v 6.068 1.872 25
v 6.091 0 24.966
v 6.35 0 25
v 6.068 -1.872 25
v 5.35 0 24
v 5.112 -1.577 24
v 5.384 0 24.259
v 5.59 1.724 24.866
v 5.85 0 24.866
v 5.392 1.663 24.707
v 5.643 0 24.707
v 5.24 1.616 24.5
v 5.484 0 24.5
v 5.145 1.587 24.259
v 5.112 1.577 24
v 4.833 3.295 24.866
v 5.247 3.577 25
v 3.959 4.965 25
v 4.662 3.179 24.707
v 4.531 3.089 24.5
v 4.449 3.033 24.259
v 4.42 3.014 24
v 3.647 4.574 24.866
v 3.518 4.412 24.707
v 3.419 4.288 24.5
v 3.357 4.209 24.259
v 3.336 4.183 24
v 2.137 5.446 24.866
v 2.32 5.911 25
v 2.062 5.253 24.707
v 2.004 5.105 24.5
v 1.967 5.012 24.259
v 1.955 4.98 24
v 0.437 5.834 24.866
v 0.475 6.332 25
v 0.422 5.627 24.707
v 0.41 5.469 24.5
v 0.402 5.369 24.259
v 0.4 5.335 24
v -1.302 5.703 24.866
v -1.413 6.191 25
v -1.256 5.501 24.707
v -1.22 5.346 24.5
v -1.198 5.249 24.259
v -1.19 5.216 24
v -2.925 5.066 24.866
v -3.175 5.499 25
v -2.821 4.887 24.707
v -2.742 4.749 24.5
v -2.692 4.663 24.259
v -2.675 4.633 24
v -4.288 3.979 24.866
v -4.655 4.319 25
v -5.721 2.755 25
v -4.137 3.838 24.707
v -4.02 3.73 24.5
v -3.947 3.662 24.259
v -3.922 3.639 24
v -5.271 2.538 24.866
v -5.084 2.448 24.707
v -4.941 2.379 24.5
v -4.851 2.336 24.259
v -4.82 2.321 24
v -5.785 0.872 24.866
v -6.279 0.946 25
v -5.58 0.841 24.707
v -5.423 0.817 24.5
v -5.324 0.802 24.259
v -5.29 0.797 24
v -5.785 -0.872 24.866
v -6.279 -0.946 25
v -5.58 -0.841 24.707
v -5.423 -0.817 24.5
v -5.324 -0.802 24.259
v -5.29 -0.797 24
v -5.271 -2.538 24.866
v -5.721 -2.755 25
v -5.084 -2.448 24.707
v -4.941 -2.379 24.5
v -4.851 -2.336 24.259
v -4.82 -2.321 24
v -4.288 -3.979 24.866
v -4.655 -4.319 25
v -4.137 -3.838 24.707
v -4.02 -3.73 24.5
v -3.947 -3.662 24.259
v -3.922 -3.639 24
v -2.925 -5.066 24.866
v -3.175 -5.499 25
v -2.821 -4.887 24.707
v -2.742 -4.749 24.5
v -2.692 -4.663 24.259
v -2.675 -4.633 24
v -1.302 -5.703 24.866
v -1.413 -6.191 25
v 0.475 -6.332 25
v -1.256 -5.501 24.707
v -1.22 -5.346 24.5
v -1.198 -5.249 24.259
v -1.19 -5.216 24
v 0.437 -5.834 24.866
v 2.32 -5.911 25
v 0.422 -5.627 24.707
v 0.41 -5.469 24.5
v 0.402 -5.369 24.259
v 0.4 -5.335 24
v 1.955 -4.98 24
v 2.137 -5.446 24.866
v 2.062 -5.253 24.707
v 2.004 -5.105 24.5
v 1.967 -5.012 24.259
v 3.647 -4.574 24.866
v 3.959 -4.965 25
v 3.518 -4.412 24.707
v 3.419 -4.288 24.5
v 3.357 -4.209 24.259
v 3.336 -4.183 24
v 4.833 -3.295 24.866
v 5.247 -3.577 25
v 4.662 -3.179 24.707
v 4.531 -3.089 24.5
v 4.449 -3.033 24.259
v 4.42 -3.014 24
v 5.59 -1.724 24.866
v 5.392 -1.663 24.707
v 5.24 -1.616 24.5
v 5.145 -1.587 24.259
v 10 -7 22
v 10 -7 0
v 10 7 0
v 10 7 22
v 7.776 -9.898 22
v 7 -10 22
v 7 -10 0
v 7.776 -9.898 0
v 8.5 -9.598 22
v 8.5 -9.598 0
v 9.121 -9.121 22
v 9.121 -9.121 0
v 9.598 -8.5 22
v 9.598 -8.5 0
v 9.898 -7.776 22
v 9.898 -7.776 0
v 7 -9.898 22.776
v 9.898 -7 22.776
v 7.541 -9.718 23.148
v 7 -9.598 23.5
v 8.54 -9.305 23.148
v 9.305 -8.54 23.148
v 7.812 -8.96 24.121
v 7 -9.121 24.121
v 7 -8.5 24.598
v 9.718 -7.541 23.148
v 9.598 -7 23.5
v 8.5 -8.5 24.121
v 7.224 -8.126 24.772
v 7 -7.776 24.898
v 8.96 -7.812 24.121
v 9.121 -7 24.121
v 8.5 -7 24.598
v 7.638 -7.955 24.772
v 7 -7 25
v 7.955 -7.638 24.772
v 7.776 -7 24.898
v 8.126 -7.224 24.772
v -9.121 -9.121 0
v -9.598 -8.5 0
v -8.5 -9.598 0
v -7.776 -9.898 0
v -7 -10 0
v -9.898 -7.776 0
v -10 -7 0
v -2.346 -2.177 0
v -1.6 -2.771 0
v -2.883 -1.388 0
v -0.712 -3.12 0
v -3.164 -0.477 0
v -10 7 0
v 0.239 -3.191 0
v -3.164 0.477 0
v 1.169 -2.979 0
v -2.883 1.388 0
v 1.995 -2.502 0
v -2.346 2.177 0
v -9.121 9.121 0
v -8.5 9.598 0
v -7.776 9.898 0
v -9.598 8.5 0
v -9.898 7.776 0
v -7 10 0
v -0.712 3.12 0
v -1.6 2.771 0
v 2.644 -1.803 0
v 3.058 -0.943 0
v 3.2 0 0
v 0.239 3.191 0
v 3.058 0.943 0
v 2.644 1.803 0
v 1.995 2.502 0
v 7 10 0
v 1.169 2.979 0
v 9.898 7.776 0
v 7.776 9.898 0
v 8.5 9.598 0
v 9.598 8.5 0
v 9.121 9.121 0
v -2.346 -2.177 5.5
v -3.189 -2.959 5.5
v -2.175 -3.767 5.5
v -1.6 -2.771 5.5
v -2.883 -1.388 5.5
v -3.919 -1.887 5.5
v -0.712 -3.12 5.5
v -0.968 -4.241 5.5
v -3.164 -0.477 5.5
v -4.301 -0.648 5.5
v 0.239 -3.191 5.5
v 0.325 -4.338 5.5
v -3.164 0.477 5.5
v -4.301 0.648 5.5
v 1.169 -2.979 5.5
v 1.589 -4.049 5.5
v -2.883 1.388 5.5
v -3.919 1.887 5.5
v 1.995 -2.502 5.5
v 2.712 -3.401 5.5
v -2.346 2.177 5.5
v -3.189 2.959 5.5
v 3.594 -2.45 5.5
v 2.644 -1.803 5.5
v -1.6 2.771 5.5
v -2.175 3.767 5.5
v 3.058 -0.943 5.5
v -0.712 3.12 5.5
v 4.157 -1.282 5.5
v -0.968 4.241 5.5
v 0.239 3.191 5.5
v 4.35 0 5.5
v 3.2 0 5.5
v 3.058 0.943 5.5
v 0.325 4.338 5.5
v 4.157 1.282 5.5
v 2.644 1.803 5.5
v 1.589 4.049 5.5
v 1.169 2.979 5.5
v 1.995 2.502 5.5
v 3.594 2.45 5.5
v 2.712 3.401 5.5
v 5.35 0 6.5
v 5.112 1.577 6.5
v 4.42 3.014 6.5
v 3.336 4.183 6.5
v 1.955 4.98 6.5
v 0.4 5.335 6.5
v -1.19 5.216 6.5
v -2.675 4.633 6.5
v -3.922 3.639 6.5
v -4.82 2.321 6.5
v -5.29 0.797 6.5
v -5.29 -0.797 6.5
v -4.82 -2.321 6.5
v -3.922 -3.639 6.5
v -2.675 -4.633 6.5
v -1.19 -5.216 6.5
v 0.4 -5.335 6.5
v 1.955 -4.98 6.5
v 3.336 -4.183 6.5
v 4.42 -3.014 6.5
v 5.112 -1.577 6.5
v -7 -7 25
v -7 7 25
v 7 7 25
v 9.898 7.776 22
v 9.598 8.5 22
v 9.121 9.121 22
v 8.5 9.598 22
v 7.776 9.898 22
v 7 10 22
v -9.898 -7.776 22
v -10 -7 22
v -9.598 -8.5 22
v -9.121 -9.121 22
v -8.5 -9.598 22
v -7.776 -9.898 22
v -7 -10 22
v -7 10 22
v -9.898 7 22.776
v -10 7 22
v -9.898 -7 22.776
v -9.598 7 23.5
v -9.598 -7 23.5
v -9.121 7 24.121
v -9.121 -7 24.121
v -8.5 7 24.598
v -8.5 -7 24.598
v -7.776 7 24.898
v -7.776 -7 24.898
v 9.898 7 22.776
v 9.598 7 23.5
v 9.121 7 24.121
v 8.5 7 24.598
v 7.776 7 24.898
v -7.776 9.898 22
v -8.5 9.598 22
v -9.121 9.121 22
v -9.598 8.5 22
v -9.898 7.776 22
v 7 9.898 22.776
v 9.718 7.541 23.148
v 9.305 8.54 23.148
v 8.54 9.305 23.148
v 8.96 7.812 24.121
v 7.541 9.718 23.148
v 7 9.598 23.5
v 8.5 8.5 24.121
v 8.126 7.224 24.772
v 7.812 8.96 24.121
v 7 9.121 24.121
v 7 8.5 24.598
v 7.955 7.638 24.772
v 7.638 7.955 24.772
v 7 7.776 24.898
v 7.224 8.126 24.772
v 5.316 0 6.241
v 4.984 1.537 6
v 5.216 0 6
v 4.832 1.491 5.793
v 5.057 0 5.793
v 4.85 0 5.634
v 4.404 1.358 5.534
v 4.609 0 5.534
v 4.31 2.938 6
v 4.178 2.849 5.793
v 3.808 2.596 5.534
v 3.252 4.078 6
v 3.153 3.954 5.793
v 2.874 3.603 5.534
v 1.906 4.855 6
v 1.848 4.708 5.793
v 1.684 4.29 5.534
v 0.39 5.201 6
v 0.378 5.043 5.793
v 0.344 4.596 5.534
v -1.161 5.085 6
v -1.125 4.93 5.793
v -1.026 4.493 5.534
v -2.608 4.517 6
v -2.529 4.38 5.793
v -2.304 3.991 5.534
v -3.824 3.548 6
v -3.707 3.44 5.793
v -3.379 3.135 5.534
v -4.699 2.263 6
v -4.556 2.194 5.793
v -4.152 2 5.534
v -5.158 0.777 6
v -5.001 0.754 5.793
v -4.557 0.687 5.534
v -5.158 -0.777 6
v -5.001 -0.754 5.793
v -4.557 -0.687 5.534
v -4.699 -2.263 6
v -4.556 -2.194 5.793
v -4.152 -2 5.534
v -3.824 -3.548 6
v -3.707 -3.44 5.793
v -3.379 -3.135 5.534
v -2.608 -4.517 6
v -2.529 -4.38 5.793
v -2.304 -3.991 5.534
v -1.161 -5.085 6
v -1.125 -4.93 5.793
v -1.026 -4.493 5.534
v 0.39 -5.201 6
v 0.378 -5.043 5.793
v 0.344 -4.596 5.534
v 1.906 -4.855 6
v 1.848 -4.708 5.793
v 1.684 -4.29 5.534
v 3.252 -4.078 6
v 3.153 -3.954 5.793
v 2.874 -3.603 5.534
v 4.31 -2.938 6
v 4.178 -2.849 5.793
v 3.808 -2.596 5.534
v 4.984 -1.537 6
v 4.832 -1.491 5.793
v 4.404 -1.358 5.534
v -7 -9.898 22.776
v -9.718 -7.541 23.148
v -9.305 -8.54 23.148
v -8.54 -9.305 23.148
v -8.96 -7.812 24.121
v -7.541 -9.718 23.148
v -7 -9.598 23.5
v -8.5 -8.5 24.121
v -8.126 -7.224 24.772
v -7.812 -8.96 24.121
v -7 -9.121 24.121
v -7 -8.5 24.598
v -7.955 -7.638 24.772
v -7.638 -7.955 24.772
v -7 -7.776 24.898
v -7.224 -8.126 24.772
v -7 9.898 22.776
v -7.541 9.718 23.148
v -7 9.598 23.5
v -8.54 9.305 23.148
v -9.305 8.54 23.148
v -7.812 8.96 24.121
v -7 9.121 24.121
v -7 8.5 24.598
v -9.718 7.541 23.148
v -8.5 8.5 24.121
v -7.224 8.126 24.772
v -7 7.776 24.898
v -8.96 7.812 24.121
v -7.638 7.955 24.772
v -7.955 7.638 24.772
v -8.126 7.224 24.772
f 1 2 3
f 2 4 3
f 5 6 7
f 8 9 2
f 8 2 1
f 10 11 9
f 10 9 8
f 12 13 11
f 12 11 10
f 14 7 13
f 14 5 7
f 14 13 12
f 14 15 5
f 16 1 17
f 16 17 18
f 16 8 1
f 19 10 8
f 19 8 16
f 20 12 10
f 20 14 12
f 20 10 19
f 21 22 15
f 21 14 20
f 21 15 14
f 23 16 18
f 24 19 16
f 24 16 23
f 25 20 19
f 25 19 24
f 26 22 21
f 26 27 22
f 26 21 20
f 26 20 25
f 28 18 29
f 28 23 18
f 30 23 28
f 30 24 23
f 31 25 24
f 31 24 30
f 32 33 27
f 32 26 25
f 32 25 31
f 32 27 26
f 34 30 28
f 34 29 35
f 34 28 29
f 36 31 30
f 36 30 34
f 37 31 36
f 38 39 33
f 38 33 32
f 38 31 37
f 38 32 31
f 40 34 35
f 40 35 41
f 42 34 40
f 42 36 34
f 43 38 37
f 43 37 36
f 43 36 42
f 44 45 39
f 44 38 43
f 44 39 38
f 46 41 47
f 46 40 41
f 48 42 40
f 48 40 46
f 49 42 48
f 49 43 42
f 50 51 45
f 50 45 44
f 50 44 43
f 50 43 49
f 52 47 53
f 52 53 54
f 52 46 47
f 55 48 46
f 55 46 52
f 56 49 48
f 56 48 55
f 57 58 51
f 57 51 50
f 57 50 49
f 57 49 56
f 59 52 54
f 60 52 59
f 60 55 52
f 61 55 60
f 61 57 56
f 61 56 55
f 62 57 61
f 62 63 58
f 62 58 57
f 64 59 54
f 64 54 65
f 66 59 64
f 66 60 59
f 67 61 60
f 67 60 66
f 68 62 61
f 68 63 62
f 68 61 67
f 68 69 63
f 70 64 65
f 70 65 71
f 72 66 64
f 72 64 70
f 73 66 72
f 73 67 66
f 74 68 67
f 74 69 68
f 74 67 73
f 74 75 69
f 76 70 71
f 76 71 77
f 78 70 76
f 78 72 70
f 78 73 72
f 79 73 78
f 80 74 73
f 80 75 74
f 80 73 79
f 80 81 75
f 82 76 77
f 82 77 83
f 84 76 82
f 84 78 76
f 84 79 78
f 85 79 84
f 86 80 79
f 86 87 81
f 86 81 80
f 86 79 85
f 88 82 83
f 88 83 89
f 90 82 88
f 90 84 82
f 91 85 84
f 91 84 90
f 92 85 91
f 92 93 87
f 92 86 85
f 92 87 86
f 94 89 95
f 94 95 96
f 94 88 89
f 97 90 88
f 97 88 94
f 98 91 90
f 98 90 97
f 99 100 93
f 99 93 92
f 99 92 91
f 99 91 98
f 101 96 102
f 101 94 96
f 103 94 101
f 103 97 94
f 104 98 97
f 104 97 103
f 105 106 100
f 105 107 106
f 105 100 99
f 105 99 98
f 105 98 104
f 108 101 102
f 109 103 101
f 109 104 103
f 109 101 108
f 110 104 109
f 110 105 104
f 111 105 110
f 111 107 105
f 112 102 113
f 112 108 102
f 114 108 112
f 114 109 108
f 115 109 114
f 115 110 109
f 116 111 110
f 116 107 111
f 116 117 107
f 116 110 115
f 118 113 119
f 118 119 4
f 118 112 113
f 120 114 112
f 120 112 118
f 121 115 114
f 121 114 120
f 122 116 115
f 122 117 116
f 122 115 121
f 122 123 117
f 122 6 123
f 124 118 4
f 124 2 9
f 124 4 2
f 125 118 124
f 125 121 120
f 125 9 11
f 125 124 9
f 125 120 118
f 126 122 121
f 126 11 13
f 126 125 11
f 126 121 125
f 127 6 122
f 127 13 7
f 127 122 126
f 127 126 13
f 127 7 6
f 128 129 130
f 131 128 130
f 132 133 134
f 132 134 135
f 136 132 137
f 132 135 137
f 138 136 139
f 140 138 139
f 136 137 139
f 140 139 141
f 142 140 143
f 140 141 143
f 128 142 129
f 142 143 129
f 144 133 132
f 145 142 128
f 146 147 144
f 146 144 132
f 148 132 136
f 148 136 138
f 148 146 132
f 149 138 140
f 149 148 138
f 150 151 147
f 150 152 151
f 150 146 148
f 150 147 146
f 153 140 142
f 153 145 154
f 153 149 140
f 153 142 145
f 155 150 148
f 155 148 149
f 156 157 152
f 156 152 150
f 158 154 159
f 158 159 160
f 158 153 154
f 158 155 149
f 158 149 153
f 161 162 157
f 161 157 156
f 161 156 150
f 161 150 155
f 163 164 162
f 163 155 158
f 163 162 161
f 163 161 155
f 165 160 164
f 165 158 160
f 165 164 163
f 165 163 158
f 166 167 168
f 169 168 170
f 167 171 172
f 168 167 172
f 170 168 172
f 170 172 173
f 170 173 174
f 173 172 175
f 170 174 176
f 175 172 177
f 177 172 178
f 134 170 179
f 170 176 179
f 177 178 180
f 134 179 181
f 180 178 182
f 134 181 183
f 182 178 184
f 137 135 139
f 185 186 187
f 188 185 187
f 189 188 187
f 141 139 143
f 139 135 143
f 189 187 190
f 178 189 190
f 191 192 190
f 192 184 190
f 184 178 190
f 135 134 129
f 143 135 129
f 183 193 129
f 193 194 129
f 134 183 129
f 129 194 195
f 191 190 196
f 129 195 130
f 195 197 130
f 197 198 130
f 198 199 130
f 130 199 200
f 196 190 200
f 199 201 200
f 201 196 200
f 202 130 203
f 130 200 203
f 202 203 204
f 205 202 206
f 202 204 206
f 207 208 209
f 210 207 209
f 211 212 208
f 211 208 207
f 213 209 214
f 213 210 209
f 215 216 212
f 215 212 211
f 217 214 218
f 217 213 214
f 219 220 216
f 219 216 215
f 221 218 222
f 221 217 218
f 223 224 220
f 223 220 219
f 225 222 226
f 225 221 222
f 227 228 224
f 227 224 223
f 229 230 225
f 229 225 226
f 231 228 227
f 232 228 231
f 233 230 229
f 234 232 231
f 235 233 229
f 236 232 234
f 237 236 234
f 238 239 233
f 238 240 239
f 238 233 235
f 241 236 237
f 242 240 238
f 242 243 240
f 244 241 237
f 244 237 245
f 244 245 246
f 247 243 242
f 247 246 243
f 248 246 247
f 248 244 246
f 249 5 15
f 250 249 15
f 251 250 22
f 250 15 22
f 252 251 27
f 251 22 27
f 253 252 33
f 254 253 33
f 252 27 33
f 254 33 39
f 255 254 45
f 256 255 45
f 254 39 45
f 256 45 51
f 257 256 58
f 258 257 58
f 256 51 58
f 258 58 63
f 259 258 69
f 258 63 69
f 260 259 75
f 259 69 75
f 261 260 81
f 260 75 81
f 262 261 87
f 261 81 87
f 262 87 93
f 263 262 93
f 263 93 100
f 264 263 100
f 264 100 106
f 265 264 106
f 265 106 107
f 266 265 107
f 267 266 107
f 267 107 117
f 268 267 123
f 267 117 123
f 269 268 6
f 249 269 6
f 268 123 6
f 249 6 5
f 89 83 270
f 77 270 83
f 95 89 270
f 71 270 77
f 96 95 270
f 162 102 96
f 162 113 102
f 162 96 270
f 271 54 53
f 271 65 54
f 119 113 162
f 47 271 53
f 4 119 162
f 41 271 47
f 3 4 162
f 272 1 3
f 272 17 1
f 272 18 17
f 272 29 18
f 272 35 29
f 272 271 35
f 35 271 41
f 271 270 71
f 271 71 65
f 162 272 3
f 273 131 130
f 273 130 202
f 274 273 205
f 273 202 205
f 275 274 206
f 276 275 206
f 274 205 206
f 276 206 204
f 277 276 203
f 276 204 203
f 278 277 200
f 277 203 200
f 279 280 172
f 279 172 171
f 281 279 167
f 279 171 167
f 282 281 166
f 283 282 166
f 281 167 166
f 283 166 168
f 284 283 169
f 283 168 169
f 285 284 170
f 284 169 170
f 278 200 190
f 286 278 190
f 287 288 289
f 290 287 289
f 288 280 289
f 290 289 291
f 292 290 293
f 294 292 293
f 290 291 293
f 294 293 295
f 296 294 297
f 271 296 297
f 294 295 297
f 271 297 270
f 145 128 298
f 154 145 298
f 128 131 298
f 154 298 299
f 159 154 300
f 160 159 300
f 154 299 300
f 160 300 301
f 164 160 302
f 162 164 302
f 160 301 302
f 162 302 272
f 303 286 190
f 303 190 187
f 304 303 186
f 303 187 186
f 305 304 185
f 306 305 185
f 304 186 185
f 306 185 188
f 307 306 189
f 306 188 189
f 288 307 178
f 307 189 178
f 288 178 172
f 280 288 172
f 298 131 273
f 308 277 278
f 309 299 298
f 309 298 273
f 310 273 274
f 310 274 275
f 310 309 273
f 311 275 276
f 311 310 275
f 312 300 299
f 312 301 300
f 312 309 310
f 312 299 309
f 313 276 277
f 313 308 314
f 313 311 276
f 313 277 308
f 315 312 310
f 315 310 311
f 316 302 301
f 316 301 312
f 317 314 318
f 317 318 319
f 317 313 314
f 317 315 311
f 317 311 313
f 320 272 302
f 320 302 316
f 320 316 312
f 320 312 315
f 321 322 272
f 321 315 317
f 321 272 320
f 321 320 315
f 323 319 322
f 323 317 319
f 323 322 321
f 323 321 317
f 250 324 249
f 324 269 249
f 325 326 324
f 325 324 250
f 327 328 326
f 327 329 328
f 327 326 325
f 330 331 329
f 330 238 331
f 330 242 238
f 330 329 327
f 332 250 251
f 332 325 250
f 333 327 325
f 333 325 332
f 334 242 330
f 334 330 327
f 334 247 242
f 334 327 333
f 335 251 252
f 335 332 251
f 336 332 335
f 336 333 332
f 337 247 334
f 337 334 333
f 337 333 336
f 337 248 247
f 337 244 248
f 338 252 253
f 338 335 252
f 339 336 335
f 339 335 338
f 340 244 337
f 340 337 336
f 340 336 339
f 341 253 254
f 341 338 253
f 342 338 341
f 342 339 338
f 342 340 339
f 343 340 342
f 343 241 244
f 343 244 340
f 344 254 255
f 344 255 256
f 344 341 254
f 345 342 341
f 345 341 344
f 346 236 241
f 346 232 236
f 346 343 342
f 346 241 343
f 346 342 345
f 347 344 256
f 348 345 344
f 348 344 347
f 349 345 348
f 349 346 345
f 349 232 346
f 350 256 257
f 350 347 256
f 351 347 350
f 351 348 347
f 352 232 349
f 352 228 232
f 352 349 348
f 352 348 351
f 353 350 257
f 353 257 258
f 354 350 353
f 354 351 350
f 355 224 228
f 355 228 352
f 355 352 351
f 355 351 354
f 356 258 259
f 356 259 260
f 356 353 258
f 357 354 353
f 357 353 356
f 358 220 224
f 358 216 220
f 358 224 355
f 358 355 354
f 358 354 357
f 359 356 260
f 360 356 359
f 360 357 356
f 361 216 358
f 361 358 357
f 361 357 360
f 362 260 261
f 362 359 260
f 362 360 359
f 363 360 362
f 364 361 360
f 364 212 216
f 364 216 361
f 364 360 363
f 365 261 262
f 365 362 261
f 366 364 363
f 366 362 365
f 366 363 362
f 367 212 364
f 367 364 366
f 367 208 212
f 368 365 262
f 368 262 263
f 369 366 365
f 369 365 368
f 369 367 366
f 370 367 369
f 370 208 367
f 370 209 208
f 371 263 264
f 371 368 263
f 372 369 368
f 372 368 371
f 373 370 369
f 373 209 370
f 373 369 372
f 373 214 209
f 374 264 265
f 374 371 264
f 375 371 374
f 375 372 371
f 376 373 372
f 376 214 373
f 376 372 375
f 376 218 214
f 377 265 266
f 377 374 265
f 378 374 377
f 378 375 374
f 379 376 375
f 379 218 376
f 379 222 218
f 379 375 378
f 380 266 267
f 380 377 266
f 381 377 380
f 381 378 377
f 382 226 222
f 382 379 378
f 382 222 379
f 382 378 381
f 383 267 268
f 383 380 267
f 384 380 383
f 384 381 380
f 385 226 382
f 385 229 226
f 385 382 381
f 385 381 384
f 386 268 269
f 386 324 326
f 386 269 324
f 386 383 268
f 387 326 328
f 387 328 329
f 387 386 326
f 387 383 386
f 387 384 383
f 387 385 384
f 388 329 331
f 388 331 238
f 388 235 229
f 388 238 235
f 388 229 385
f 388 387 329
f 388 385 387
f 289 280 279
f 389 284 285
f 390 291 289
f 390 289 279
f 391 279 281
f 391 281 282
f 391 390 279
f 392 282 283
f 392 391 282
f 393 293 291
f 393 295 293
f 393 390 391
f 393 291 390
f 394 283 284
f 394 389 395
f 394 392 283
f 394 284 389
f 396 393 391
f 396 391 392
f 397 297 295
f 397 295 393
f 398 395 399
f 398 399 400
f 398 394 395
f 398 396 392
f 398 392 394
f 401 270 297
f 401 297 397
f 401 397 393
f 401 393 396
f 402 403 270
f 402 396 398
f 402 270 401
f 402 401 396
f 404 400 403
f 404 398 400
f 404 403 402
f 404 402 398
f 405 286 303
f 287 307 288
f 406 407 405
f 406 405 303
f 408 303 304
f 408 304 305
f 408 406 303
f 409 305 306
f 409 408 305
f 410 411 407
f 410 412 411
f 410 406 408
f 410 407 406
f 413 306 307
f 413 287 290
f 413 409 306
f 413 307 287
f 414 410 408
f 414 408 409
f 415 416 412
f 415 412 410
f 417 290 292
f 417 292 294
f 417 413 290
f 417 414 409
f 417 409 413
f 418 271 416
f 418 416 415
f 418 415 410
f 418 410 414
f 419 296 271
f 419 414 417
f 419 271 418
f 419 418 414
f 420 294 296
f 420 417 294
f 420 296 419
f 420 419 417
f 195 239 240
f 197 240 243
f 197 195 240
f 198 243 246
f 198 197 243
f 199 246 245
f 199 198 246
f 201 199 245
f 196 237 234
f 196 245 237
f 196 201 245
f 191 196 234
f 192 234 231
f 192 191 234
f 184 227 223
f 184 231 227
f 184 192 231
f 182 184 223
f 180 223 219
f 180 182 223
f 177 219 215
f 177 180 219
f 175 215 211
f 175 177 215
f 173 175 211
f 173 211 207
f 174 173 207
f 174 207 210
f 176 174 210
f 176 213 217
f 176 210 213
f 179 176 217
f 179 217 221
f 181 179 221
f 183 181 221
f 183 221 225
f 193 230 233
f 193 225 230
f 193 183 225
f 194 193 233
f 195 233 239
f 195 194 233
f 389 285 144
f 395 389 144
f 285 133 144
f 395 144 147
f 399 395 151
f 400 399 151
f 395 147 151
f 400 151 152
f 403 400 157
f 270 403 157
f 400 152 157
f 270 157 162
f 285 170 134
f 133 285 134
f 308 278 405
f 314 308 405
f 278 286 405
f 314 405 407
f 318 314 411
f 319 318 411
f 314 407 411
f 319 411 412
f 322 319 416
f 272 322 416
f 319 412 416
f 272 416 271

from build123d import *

# Parameters (mm, degrees)
SKETCH1_R           = 3.2
BOSS_EXTRUDE1_DEPTH = 25
FILLET1_R           = 3
SKETCH2_R           = 5.35
CUT_EXTRUDE1_DEPTH  = 19.5
FILLET2_R           = 1
FILLET3_R           = 1


with BuildPart() as part:
    # Sketch1 → Boss-Extrude1 (new body)
    with BuildSketch(Plane.XY):
        with BuildLine():
            Line((-7, -10), (7, -10))
            ThreePointArc((7, -10), (9.121320344, -9.121320344), (10, -7))
            Line((10, -7), (10, 7))
            ThreePointArc((10, 7), (9.121320344, 9.121320344), (7, 10))
            Line((7, 10), (-7, 10))
            ThreePointArc((-7, 10), (-9.121320344, 9.121320344), (-10, 7))
            Line((-10, 7), (-10, -7))
            ThreePointArc((-10, -7), (-9.121320344, -9.121320344), (-7, -10))
        make_face()
        Circle(SKETCH1_R, mode=Mode.SUBTRACT)
    extrude(amount=BOSS_EXTRUDE1_DEPTH)

    # Fillet1
    fillet1_edges = [part.edges().sort_by_distance(p)[0] for p in [
        (9.121320344, 9.121320344, 25),
        (0, 10, 25),
        (-9.121320344, 9.121320344, 25),
        (-10, 0, 25),
        (-9.121320344, -9.121320344, 25),
        (0, -10, 25),
        (9.121320344, -9.121320344, 25),
        (10, 0, 25),
    ]]
    fillet(fillet1_edges, radius=FILLET1_R)

    # Sketch2 → Cut-Extrude1 (cut)
    with BuildSketch(Plane.XY.offset(25)):
        Circle(SKETCH2_R)
    extrude(amount=-CUT_EXTRUDE1_DEPTH, mode=Mode.SUBTRACT)

    # Fillet2
    fillet2_edges = [part.edges().sort_by_distance(p)[0] for p in [
        (-5.35, 0, 25),
    ]]
    fillet(fillet2_edges, radius=FILLET2_R)

    # Fillet3
    fillet3_edges = [part.edges().sort_by_distance(p)[0] for p in [
        (-5.35, 0, 5.5),
    ]]
    fillet(fillet3_edges, radius=FILLET3_R)


solid = part.part
